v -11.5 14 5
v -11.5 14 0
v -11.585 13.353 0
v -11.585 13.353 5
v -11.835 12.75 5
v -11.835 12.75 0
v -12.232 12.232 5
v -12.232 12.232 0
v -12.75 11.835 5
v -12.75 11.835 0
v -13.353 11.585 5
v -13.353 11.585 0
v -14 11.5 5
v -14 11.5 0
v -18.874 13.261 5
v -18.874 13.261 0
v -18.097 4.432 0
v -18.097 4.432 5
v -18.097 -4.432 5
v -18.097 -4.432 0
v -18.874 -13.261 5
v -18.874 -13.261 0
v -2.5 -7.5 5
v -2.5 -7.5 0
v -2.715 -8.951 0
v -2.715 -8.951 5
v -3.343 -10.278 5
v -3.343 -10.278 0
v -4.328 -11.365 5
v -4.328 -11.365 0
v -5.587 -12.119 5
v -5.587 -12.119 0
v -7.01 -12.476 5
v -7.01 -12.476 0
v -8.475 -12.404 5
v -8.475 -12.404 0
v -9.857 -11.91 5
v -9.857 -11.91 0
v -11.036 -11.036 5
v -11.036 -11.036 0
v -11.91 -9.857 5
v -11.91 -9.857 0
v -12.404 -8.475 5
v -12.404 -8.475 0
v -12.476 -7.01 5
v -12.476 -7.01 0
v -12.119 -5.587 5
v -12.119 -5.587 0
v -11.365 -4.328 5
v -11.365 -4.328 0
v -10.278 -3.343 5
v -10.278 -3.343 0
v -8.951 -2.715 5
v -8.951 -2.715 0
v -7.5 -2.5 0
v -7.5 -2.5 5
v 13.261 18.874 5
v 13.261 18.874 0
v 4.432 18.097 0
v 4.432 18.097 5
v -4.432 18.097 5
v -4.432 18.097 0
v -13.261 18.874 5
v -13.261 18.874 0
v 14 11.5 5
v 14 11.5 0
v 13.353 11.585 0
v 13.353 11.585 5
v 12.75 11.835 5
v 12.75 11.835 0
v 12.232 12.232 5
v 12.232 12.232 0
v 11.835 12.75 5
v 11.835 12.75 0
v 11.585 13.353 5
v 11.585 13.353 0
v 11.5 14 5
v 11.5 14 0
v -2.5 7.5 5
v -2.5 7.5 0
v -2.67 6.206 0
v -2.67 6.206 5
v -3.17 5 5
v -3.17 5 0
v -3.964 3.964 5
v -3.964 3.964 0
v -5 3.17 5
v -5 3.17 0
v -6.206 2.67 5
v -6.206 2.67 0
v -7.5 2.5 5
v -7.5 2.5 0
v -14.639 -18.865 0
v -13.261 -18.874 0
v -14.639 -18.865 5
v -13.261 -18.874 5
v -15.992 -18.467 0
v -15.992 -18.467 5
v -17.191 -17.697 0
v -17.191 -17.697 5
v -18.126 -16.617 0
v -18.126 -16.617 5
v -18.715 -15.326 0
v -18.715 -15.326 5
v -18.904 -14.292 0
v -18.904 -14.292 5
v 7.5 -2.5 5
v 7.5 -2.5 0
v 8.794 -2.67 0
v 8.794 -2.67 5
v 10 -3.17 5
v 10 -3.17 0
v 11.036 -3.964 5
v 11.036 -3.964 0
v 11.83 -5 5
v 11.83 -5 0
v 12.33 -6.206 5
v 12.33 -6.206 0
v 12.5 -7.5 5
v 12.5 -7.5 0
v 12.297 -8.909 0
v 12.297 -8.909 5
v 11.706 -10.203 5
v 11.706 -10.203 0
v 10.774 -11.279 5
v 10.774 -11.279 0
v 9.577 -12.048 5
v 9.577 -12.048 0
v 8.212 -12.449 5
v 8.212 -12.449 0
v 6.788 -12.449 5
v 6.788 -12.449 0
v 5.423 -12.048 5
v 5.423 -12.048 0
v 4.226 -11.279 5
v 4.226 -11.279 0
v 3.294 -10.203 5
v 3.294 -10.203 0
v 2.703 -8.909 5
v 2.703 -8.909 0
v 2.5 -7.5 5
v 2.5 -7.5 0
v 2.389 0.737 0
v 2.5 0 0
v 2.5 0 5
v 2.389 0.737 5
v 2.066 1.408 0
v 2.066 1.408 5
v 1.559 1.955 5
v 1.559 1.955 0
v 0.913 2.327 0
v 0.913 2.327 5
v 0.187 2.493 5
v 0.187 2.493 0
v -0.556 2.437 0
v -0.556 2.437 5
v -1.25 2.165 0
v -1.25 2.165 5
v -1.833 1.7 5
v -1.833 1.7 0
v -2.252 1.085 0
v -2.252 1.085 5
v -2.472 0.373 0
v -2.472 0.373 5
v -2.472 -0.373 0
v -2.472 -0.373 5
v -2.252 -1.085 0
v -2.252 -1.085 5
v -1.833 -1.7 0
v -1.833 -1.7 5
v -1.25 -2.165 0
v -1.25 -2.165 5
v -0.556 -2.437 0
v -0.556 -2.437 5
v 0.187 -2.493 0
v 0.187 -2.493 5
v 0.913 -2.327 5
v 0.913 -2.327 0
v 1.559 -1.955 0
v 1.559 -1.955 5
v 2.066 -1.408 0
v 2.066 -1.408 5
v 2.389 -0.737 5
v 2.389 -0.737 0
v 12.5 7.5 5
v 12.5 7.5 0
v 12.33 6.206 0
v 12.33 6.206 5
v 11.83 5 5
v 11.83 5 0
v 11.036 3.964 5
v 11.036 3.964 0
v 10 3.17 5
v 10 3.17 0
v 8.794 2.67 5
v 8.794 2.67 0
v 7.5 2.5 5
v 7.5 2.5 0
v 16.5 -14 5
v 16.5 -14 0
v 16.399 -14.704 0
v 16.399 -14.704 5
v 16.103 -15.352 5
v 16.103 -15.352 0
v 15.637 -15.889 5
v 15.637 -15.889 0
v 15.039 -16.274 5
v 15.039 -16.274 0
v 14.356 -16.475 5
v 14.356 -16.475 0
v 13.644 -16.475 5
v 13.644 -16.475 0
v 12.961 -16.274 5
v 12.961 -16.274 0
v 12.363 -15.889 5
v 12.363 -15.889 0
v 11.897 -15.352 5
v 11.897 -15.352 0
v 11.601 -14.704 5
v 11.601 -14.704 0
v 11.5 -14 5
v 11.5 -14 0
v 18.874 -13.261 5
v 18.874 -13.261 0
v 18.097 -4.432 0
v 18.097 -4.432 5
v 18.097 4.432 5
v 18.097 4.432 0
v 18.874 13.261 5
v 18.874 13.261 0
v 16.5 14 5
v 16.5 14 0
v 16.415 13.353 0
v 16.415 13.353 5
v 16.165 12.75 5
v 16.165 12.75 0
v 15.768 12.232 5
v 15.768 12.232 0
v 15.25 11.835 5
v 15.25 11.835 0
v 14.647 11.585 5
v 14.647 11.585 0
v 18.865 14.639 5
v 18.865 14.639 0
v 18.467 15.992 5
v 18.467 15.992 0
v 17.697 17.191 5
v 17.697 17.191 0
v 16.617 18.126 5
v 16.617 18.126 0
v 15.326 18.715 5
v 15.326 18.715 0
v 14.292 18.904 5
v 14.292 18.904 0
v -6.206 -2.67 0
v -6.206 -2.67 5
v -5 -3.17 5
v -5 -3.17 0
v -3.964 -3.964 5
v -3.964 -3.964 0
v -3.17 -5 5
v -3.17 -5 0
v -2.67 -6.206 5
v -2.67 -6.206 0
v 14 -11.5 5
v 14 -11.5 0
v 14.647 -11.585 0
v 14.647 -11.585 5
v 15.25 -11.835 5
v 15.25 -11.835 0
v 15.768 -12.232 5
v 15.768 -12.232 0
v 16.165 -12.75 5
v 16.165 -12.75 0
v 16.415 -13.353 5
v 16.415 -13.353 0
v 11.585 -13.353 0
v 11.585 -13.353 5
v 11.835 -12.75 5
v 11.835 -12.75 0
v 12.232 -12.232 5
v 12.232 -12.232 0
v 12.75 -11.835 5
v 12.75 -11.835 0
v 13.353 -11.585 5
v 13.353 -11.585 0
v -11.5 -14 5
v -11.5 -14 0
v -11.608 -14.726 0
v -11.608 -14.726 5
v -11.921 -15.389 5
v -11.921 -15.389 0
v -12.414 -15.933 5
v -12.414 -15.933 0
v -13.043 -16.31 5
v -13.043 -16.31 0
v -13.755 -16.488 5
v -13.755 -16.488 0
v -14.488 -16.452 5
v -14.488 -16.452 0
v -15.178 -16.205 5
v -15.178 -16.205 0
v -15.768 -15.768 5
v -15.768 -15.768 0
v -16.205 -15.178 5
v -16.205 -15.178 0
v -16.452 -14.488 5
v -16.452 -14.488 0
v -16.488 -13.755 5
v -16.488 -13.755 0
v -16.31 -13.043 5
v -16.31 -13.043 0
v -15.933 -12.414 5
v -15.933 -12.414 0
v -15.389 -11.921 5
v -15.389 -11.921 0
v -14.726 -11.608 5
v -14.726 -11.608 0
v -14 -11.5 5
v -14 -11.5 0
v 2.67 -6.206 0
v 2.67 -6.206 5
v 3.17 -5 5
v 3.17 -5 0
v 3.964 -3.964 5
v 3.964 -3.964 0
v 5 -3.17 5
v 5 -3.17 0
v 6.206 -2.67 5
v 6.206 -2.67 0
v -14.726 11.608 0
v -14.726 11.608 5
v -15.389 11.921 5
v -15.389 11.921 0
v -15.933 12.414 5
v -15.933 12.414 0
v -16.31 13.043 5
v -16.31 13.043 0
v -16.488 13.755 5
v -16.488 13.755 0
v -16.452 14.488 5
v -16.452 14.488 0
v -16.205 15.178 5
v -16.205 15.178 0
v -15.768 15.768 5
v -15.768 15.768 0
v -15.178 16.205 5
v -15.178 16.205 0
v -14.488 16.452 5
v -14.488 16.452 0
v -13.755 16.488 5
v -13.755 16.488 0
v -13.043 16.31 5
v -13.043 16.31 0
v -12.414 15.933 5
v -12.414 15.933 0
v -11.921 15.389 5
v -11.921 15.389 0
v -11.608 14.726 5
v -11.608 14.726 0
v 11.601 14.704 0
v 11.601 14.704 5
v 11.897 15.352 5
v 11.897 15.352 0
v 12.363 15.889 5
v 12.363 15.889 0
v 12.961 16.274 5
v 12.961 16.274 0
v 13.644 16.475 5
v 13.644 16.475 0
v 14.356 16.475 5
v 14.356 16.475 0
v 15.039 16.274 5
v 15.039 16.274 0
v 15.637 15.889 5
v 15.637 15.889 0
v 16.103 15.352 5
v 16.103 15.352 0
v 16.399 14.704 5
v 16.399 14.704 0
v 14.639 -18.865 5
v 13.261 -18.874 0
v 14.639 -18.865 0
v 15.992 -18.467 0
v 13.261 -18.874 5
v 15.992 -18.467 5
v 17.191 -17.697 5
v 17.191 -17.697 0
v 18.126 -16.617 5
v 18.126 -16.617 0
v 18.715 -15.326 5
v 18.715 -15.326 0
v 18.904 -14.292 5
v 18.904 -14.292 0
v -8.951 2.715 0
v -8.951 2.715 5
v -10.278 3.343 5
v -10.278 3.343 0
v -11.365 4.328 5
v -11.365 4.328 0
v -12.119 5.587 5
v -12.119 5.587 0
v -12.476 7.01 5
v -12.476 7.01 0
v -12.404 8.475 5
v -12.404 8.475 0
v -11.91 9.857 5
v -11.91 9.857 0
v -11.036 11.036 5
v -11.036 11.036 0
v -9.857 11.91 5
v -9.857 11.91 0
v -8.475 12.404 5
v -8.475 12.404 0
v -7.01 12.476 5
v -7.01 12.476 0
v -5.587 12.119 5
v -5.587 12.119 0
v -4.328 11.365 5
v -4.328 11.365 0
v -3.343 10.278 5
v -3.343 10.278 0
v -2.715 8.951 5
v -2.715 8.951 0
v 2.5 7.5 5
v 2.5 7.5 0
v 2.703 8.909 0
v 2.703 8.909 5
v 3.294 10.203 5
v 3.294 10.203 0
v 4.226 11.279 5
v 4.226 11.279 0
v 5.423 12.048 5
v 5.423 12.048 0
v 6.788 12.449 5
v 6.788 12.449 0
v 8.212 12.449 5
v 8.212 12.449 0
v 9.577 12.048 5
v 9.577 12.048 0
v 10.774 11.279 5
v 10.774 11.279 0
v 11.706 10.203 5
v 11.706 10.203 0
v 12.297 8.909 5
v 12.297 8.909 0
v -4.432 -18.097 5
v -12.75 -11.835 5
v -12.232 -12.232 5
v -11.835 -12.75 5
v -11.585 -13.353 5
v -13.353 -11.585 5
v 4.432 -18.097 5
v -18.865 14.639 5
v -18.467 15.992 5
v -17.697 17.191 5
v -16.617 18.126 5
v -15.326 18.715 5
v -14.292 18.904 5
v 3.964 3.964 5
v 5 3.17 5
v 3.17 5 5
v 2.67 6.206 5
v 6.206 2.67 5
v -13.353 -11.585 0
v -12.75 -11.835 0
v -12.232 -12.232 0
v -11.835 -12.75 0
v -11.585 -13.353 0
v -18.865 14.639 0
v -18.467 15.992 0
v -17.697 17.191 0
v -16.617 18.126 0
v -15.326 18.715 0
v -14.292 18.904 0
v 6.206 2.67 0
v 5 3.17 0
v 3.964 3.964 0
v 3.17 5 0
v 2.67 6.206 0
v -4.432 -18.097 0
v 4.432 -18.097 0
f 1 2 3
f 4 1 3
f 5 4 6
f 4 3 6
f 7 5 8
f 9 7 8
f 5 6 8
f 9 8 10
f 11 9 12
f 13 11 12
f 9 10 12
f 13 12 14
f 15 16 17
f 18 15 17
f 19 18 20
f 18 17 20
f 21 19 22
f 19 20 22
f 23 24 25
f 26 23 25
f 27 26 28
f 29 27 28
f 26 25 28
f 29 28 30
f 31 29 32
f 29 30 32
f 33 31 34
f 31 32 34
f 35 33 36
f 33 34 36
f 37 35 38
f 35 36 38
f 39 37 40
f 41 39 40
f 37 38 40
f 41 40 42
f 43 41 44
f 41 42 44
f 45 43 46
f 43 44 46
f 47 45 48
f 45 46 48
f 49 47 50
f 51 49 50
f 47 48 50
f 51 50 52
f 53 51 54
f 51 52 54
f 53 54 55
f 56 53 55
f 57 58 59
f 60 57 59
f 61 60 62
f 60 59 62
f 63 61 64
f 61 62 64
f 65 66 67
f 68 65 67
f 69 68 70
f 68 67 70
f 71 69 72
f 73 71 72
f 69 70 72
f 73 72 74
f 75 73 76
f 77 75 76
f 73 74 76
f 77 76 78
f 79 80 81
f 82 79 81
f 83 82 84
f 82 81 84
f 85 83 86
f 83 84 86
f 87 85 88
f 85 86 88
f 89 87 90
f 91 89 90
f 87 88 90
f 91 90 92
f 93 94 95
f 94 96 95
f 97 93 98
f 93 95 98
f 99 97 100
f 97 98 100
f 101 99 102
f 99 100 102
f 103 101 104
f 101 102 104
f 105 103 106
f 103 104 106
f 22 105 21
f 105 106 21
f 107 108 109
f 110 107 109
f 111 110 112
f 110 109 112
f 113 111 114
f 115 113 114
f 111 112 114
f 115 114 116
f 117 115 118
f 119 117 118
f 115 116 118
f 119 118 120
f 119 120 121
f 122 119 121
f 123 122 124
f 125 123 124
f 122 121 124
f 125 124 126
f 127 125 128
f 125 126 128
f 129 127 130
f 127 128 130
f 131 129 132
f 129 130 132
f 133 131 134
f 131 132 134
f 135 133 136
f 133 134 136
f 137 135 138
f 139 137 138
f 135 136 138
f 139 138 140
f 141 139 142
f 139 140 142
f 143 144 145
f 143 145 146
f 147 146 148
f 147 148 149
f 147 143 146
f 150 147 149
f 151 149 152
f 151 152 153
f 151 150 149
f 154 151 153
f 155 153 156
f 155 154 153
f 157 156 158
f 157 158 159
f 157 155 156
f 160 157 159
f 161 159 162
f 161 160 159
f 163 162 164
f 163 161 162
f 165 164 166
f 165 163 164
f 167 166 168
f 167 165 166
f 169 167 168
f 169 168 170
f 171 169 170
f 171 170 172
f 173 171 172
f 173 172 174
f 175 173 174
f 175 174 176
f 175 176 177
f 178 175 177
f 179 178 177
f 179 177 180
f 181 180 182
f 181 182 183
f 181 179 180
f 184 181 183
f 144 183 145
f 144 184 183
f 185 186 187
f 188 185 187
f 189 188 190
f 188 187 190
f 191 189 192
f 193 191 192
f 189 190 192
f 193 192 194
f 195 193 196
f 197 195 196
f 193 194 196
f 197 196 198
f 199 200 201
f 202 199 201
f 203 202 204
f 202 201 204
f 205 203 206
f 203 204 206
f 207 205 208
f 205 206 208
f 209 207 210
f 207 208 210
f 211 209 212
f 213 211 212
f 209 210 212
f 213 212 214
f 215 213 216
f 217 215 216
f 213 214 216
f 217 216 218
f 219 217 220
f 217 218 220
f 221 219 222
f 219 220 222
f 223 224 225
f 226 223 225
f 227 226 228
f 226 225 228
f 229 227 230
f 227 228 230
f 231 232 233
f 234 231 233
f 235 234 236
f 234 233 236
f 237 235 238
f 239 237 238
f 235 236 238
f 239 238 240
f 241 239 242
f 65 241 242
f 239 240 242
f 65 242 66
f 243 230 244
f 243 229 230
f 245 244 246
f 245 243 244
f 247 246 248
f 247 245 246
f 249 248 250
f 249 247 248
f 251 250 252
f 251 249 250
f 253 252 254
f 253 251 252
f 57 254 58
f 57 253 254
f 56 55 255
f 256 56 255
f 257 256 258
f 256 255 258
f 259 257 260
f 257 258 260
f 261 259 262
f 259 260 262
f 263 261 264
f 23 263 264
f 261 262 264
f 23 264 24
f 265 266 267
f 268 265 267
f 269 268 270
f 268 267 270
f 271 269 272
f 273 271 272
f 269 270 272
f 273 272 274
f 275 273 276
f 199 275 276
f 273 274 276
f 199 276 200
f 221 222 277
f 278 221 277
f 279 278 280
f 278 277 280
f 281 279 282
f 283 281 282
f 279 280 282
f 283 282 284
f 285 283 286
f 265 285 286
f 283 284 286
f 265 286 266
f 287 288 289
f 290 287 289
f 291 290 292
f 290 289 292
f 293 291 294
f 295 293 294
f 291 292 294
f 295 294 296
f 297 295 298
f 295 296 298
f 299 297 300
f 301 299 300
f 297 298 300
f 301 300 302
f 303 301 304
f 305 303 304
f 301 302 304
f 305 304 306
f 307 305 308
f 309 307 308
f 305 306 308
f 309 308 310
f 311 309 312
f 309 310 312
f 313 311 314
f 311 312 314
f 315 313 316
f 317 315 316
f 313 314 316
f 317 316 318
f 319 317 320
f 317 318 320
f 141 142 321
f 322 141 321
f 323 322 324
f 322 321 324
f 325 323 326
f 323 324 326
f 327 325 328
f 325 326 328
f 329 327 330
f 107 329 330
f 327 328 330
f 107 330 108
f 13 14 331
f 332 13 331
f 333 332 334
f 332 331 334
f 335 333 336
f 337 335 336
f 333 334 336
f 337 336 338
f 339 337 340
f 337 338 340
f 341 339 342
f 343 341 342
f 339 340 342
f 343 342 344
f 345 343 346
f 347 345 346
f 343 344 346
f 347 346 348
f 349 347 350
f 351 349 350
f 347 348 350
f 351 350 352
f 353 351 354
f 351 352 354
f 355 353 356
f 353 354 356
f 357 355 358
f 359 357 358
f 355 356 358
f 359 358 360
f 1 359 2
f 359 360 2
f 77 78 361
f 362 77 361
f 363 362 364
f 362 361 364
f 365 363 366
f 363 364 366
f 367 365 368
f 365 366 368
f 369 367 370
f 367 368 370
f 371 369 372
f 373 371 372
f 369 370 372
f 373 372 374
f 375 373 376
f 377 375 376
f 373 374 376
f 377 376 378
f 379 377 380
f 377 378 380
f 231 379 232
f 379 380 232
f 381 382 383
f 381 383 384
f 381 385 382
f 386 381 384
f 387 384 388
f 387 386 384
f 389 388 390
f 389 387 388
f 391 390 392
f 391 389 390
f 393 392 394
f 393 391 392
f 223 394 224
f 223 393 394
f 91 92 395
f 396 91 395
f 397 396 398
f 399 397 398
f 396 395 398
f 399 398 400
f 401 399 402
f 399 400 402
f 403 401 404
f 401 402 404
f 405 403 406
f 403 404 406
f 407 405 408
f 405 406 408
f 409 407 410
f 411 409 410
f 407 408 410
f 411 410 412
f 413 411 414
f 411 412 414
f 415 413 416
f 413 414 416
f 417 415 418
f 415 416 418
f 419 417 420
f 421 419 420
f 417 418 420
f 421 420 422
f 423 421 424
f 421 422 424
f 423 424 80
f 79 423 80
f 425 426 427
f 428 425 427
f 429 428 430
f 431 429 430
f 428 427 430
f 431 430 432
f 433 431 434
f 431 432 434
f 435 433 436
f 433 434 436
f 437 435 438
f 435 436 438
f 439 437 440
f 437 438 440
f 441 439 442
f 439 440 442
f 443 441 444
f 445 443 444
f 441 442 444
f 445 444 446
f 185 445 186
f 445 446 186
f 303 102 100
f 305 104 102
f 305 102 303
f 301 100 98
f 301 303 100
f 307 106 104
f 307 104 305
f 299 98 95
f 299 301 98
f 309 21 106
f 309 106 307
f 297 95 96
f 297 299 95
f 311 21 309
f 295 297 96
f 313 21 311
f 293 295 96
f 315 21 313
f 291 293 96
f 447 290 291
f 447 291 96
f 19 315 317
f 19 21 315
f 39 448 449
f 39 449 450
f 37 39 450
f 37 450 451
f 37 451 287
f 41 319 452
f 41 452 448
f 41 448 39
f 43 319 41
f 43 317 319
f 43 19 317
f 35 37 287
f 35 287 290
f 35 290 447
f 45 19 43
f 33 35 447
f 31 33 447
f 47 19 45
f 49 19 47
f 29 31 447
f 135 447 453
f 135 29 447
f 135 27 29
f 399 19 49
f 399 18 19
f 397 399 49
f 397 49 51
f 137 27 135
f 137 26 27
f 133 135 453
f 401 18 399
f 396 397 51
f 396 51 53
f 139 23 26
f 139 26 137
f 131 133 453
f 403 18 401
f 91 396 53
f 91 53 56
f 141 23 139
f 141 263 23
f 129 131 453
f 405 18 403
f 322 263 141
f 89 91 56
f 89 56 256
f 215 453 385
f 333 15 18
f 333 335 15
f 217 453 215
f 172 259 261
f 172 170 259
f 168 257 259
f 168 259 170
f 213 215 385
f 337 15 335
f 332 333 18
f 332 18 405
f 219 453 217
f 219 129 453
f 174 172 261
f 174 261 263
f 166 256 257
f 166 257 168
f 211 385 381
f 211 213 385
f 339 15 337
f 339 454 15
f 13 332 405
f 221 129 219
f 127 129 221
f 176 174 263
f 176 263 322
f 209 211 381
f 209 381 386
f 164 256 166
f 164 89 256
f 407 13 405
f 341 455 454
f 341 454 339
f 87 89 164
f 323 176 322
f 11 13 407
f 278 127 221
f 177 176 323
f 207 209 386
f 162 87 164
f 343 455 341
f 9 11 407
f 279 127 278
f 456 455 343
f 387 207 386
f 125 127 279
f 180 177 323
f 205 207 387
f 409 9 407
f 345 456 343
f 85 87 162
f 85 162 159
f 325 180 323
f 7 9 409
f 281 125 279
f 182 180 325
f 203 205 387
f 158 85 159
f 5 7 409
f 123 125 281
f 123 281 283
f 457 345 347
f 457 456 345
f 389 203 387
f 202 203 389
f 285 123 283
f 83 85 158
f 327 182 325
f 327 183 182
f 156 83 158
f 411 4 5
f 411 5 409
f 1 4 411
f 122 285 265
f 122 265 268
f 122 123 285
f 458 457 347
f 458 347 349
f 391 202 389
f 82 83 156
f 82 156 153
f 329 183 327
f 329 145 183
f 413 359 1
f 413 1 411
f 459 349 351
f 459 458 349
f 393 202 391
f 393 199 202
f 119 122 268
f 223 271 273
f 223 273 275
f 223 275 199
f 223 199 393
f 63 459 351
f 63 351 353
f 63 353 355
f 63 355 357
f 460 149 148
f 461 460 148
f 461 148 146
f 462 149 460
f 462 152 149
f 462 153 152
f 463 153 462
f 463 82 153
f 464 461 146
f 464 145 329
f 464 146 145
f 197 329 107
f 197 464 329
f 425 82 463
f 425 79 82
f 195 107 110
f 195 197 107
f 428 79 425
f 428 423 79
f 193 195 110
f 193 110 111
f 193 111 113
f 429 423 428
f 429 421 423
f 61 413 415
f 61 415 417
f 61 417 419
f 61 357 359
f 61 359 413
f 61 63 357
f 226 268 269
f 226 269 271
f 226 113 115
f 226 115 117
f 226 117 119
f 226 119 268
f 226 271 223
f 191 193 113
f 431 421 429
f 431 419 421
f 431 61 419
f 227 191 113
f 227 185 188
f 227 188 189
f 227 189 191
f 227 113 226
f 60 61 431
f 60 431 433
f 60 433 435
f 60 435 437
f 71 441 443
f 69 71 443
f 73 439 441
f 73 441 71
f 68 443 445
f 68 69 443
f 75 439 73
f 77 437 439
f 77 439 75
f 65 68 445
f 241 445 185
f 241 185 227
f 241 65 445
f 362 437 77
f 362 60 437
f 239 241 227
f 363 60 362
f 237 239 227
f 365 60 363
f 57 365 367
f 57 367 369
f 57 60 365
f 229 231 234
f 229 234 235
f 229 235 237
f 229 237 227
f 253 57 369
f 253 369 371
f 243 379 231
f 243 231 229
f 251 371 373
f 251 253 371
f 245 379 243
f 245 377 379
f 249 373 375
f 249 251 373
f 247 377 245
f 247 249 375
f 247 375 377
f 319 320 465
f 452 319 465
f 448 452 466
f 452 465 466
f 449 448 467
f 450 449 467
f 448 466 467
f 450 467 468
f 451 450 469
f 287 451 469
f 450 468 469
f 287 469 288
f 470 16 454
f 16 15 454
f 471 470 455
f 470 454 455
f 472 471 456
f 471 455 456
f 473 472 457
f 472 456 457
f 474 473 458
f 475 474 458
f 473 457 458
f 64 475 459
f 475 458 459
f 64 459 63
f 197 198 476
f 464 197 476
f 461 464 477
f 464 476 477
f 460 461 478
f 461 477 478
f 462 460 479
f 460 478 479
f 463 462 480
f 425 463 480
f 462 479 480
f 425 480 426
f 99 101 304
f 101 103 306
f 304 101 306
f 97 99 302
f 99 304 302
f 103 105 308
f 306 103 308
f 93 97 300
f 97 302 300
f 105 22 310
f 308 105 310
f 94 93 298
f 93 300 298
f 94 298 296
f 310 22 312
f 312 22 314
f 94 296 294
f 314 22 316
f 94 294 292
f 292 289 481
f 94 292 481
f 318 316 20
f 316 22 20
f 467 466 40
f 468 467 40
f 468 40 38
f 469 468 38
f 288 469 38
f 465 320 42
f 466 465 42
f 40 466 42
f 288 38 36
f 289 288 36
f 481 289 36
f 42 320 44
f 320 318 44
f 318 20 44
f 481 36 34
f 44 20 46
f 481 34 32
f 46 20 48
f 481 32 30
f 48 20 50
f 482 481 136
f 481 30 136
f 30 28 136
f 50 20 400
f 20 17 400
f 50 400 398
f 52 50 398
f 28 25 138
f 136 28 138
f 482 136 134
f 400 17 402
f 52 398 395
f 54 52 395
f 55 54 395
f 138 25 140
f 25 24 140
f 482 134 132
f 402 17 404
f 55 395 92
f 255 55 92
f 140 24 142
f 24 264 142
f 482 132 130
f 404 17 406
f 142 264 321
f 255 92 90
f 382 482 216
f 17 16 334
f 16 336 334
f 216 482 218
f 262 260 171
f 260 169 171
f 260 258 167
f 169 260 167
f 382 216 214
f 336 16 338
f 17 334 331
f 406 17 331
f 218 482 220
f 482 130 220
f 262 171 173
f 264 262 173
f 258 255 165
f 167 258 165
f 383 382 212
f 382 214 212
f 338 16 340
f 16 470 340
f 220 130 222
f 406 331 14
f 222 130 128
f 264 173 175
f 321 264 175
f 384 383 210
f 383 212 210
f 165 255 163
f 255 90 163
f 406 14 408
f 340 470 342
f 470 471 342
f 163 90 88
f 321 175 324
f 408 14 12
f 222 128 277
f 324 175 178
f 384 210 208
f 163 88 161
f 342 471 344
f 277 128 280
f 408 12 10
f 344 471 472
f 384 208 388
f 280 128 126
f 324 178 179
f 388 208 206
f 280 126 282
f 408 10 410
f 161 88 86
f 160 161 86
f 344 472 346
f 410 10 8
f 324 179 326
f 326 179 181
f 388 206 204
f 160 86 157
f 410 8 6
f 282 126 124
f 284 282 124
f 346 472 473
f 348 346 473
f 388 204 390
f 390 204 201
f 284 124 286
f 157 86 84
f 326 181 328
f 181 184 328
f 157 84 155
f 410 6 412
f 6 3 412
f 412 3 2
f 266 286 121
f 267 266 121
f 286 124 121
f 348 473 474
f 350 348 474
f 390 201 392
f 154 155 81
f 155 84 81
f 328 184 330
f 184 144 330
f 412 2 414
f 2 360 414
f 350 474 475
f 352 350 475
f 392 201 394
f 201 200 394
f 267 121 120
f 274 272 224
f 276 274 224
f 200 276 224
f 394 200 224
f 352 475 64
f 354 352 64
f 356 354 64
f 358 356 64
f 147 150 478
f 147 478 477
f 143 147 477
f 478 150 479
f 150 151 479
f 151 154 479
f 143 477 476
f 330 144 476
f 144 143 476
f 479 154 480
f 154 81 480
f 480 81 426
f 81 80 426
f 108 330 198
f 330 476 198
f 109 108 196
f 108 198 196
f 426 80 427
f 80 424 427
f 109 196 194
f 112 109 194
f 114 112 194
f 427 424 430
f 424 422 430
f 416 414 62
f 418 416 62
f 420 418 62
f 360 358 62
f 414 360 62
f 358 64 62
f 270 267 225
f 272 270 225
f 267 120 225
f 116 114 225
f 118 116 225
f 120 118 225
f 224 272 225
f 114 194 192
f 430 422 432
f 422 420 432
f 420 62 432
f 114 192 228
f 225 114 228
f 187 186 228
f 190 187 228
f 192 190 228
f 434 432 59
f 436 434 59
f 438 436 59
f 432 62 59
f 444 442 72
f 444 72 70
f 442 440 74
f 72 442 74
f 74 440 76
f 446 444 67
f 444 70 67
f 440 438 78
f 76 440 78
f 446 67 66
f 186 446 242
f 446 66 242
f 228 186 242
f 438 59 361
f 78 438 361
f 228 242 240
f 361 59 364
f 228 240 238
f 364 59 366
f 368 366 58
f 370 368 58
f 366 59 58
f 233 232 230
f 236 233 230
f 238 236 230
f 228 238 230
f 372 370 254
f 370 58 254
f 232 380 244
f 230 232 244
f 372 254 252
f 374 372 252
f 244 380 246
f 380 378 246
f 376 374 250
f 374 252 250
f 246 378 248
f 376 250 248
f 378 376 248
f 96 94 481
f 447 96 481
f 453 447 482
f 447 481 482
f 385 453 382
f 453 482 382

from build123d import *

# Parameters (mm, degrees)
F0_R     = 2.5
F1_DEPTH = 5
F2_R     = 5


with BuildPart() as f1:
    # F0 (on Top) → F1 (new body)
    with BuildSketch(Plane.XY):
        with BuildLine():
            ThreePointArc((-20, -20), (0, -18), (20, -20))
            ThreePointArc((20, -20), (18, 0), (20, 20))
            ThreePointArc((20, 20), (0, 18), (-20, 20))
            ThreePointArc((-20, 20), (-18, 0), (-20, -20))
        make_face()
        with BuildLine():
            ThreePointArc((16.5, 14), (15.767766953, 12.232233047), (14, 11.5))
            Line((14, 11.5), (14, -11.5))
            ThreePointArc((14, -11.5), (15.767766953, -12.232233047), (16.5, -14))
            ThreePointArc((16.5, -14), (14, -16.5), (11.5, -14))
            Line((11.5, -14), (-11.5, -14))
            ThreePointArc((-11.5, -14), (-15.767766953, -15.767766953), (-14, -11.5))
            Line((-14, -11.5), (-14, 11.5))
            ThreePointArc((-14, 11.5), (-15.767766953, 15.767766953), (-11.5, 14))
            Line((-11.5, 14), (11.5, 14))
            ThreePointArc((11.5, 14), (14, 16.5), (16.5, 14))
        make_face(mode=Mode.SUBTRACT)
        with BuildLine():
            Line((14, -11.5), (14, 11.5))
            ThreePointArc((14, 11.5), (12.232233047, 12.232233047), (11.5, 14))
            Line((11.5, 14), (-11.5, 14))
            ThreePointArc((-11.5, 14), (-12.232233047, 12.232233047), (-14, 11.5))
            Line((-14, 11.5), (-14, -11.5))
            ThreePointArc((-14, -11.5), (-12.232233047, -12.232233047), (-11.5, -14))
            Line((-11.5, -14), (11.5, -14))
            ThreePointArc((11.5, -14), (12.232233047, -12.232233047), (14, -11.5))
        make_face()
        with BuildLine():
            Line((2.5, -7.5), (-2.5, -7.5))
            ThreePointArc((-2.5, -7.5), (-11.0355339059, -11.0355339059), (-7.5, -2.5))
            Line((-7.5, -2.5), (-7.5, 2.5))
            ThreePointArc((-7.5, 2.5), (-11.0355339059, 11.0355339059), (-2.5, 7.5))
            Line((-2.5, 7.5), (2.5, 7.5))
            ThreePointArc((2.5, 7.5), (7.5, 12.5), (12.5, 7.5))
            ThreePointArc((12.5, 7.5), (11.0355339059, 3.9644660941), (7.5, 2.5))
            Line((7.5, 2.5), (7.5, -2.5))
            ThreePointArc((7.5, -2.5), (11.0355339059, -3.9644660941), (12.5, -7.5))
            ThreePointArc((12.5, -7.5), (7.5, -12.5), (2.5, -7.5))
        make_face(mode=Mode.SUBTRACT)
        with BuildLine():
            ThreePointArc((-7.5, -2.5), (-3.9644660941, -3.9644660941), (-2.5, -7.5))
            Line((-2.5, -7.5), (2.5, -7.5))
            ThreePointArc((2.5, -7.5), (3.9644660941, -3.9644660941), (7.5, -2.5))
            Line((7.5, -2.5), (7.5, 2.5))
            ThreePointArc((7.5, 2.5), (3.9644660941, 3.9644660941), (2.5, 7.5))
            Line((2.5, 7.5), (-2.5, 7.5))
            ThreePointArc((-2.5, 7.5), (-3.9644660941, 3.9644660941), (-7.5, 2.5))
            Line((-7.5, 2.5), (-7.5, -2.5))
        make_face()
        Circle(F0_R, mode=Mode.SUBTRACT)
    extrude(amount=F1_DEPTH)

    # F2
    f2_edges = [f1.edges().sort_by_distance(p)[0] for p in [
        (20, -20, 2.5),
        (-20, -20, 2.5),
        (20, 20, 2.5),
        (-20, 20, 2.5),
    ]]
    fillet(f2_edges, radius=F2_R)


solid = f1.part
